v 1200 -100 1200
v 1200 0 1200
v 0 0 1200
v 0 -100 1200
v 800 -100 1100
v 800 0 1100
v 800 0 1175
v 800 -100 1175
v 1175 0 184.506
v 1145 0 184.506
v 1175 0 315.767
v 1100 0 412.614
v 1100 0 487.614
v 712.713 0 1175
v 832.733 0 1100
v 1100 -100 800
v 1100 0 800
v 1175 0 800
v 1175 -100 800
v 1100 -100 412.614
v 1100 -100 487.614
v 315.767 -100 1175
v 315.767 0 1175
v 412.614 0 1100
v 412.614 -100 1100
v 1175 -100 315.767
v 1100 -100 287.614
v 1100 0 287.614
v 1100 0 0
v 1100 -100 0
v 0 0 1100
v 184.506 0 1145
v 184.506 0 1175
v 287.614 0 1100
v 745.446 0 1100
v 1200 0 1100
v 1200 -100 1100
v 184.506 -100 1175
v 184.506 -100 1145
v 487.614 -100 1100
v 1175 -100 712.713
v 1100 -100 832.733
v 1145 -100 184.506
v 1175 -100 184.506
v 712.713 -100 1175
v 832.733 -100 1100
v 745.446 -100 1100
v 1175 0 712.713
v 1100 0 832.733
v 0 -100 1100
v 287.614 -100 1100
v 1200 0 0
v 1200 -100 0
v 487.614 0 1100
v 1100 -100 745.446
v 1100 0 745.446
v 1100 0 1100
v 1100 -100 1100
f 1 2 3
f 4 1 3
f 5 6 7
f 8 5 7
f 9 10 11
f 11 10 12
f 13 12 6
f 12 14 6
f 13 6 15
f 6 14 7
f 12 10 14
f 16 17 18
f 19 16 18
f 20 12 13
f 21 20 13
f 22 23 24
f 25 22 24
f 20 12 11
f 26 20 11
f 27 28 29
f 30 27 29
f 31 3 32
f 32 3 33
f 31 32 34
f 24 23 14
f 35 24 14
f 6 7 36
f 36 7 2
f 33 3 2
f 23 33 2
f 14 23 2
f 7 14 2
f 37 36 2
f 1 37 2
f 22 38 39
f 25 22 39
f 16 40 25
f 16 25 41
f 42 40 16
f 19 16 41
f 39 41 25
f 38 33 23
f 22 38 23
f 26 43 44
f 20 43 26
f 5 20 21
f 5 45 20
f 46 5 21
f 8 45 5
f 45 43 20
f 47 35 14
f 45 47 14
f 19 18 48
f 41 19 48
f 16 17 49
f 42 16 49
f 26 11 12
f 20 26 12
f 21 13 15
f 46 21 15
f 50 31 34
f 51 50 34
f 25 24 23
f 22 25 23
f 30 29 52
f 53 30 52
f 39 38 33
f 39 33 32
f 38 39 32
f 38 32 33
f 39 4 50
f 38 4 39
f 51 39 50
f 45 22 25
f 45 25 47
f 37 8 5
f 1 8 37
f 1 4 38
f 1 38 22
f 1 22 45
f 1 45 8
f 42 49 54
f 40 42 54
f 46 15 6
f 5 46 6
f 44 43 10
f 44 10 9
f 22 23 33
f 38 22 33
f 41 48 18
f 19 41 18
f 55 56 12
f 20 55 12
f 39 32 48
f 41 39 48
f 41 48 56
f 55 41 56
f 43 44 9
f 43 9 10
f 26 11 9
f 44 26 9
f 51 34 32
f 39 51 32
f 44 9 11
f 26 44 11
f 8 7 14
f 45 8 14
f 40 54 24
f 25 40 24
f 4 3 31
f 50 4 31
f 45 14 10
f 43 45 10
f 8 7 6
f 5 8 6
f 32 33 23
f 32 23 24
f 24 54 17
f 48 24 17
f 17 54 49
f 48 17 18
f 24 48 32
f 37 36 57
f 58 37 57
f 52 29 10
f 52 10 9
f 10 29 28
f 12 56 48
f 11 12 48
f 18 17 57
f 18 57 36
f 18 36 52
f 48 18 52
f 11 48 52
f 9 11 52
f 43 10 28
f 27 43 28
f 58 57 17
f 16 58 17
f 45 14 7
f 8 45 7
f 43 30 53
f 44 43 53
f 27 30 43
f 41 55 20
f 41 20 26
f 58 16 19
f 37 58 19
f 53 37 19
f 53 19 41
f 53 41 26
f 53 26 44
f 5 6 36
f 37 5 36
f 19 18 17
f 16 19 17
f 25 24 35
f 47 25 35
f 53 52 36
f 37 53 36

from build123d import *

# Parameters (mm, degrees)
F1_DEPTH = 100
F2_DEPTH = 100
F0_W     = 100
F0_H     = 100
F3_DEPTH = 100
F4_DEPTH = 100


with BuildPart() as f1:
    # F0 (on Front) → F1 (new body)
    with BuildSketch(Plane.XZ):
        Polygon((745.445527441, 1100), (800, 1100), (800, 1175), (712.7128439056, 1175), align=None)
        Polygon((913.9371630128, 913.9371630128), (832.7326835354, 1100), (800, 1100), (745.445527441, 1100), (806.1118525432, 960.9959865422), align=None)
        Polygon((806.1118525432, 960.9959865422), (853.1706760726, 853.1706760726), (960.9959865422, 806.1118525432), (913.9371630128, 913.9371630128), align=None)
        Polygon((960.9959865422, 806.1118525432), (853.1706760726, 853.1706760726), (1100, 287.6136457566), (1100, 412.6136457566), (1100, 487.6136457566), align=None)
        Polygon((1100, 412.6136457566), (1100, 287.6136457566), (1145, 184.5056926201), (1175, 184.5056926201), (1175, 315.7670571958), align=None)
    extrude(amount=F1_DEPTH)


with BuildPart() as f2:
    # F0 (on Front) → F2 (new body)
    with BuildSketch(Plane.XZ):
        Polygon((184.5056926201, 1145), (287.6136457566, 1100), (412.6136457566, 1100), (315.7670571958, 1175), (184.5056926201, 1175), align=None)
        Polygon((412.6136457566, 1100), (287.6136457566, 1100), (853.1706760726, 853.1706760726), (806.1118525432, 960.9959865422), (487.6136457566, 1100), align=None)
        Polygon((806.1118525432, 960.9959865422), (853.1706760726, 853.1706760726), (960.9959865422, 806.1118525432), (913.9371630128, 913.9371630128), align=None)
        Polygon((1100, 800), (1100, 832.7326835354), (913.9371630128, 913.9371630128), (960.9959865422, 806.1118525432), (1100, 745.445527441), align=None)
        Polygon((1175, 800), (1100, 800), (1100, 745.445527441), (1175, 712.7128439056), align=None)
    extrude(amount=F2_DEPTH)


with BuildPart() as f3:
    # F0 (on Front) → F3 (new body)
    with BuildSketch(Plane.XZ):
        Polygon((1100, 1200), (0, 1200), (0, 1100), (287.6136457566, 1100), (184.5056926201, 1145), (184.5056926201, 1175), (315.7670571958, 1175), (412.6136457566, 1100), (487.6136457566, 1100), (745.445527441, 1100), (712.7128439056, 1175), (800, 1175), (800, 1100), (832.7326835354, 1100), (1100, 1100), align=None)
        with Locations((1150, 1150)):
            Rectangle(F0_W, F0_H)
    extrude(amount=F3_DEPTH)


with BuildPart() as f4:
    # F0 (on Front) → F4 (new body)
    with BuildSketch(Plane.XZ):
        Polygon((1200, 1100), (1100, 1100), (1100, 832.7326835354), (1100, 800), (1175, 800), (1175, 712.7128439056), (1100, 745.445527441), (1100, 487.6136457566), (1100, 412.6136457566), (1175, 315.7670571958), (1175, 184.5056926201), (1145, 184.5056926201), (1100, 287.6136457566), (1100, 0), (1200, 0), align=None)
    extrude(amount=F4_DEPTH)


solid = Compound([f1.part, f2.part, f3.part, f4.part])
